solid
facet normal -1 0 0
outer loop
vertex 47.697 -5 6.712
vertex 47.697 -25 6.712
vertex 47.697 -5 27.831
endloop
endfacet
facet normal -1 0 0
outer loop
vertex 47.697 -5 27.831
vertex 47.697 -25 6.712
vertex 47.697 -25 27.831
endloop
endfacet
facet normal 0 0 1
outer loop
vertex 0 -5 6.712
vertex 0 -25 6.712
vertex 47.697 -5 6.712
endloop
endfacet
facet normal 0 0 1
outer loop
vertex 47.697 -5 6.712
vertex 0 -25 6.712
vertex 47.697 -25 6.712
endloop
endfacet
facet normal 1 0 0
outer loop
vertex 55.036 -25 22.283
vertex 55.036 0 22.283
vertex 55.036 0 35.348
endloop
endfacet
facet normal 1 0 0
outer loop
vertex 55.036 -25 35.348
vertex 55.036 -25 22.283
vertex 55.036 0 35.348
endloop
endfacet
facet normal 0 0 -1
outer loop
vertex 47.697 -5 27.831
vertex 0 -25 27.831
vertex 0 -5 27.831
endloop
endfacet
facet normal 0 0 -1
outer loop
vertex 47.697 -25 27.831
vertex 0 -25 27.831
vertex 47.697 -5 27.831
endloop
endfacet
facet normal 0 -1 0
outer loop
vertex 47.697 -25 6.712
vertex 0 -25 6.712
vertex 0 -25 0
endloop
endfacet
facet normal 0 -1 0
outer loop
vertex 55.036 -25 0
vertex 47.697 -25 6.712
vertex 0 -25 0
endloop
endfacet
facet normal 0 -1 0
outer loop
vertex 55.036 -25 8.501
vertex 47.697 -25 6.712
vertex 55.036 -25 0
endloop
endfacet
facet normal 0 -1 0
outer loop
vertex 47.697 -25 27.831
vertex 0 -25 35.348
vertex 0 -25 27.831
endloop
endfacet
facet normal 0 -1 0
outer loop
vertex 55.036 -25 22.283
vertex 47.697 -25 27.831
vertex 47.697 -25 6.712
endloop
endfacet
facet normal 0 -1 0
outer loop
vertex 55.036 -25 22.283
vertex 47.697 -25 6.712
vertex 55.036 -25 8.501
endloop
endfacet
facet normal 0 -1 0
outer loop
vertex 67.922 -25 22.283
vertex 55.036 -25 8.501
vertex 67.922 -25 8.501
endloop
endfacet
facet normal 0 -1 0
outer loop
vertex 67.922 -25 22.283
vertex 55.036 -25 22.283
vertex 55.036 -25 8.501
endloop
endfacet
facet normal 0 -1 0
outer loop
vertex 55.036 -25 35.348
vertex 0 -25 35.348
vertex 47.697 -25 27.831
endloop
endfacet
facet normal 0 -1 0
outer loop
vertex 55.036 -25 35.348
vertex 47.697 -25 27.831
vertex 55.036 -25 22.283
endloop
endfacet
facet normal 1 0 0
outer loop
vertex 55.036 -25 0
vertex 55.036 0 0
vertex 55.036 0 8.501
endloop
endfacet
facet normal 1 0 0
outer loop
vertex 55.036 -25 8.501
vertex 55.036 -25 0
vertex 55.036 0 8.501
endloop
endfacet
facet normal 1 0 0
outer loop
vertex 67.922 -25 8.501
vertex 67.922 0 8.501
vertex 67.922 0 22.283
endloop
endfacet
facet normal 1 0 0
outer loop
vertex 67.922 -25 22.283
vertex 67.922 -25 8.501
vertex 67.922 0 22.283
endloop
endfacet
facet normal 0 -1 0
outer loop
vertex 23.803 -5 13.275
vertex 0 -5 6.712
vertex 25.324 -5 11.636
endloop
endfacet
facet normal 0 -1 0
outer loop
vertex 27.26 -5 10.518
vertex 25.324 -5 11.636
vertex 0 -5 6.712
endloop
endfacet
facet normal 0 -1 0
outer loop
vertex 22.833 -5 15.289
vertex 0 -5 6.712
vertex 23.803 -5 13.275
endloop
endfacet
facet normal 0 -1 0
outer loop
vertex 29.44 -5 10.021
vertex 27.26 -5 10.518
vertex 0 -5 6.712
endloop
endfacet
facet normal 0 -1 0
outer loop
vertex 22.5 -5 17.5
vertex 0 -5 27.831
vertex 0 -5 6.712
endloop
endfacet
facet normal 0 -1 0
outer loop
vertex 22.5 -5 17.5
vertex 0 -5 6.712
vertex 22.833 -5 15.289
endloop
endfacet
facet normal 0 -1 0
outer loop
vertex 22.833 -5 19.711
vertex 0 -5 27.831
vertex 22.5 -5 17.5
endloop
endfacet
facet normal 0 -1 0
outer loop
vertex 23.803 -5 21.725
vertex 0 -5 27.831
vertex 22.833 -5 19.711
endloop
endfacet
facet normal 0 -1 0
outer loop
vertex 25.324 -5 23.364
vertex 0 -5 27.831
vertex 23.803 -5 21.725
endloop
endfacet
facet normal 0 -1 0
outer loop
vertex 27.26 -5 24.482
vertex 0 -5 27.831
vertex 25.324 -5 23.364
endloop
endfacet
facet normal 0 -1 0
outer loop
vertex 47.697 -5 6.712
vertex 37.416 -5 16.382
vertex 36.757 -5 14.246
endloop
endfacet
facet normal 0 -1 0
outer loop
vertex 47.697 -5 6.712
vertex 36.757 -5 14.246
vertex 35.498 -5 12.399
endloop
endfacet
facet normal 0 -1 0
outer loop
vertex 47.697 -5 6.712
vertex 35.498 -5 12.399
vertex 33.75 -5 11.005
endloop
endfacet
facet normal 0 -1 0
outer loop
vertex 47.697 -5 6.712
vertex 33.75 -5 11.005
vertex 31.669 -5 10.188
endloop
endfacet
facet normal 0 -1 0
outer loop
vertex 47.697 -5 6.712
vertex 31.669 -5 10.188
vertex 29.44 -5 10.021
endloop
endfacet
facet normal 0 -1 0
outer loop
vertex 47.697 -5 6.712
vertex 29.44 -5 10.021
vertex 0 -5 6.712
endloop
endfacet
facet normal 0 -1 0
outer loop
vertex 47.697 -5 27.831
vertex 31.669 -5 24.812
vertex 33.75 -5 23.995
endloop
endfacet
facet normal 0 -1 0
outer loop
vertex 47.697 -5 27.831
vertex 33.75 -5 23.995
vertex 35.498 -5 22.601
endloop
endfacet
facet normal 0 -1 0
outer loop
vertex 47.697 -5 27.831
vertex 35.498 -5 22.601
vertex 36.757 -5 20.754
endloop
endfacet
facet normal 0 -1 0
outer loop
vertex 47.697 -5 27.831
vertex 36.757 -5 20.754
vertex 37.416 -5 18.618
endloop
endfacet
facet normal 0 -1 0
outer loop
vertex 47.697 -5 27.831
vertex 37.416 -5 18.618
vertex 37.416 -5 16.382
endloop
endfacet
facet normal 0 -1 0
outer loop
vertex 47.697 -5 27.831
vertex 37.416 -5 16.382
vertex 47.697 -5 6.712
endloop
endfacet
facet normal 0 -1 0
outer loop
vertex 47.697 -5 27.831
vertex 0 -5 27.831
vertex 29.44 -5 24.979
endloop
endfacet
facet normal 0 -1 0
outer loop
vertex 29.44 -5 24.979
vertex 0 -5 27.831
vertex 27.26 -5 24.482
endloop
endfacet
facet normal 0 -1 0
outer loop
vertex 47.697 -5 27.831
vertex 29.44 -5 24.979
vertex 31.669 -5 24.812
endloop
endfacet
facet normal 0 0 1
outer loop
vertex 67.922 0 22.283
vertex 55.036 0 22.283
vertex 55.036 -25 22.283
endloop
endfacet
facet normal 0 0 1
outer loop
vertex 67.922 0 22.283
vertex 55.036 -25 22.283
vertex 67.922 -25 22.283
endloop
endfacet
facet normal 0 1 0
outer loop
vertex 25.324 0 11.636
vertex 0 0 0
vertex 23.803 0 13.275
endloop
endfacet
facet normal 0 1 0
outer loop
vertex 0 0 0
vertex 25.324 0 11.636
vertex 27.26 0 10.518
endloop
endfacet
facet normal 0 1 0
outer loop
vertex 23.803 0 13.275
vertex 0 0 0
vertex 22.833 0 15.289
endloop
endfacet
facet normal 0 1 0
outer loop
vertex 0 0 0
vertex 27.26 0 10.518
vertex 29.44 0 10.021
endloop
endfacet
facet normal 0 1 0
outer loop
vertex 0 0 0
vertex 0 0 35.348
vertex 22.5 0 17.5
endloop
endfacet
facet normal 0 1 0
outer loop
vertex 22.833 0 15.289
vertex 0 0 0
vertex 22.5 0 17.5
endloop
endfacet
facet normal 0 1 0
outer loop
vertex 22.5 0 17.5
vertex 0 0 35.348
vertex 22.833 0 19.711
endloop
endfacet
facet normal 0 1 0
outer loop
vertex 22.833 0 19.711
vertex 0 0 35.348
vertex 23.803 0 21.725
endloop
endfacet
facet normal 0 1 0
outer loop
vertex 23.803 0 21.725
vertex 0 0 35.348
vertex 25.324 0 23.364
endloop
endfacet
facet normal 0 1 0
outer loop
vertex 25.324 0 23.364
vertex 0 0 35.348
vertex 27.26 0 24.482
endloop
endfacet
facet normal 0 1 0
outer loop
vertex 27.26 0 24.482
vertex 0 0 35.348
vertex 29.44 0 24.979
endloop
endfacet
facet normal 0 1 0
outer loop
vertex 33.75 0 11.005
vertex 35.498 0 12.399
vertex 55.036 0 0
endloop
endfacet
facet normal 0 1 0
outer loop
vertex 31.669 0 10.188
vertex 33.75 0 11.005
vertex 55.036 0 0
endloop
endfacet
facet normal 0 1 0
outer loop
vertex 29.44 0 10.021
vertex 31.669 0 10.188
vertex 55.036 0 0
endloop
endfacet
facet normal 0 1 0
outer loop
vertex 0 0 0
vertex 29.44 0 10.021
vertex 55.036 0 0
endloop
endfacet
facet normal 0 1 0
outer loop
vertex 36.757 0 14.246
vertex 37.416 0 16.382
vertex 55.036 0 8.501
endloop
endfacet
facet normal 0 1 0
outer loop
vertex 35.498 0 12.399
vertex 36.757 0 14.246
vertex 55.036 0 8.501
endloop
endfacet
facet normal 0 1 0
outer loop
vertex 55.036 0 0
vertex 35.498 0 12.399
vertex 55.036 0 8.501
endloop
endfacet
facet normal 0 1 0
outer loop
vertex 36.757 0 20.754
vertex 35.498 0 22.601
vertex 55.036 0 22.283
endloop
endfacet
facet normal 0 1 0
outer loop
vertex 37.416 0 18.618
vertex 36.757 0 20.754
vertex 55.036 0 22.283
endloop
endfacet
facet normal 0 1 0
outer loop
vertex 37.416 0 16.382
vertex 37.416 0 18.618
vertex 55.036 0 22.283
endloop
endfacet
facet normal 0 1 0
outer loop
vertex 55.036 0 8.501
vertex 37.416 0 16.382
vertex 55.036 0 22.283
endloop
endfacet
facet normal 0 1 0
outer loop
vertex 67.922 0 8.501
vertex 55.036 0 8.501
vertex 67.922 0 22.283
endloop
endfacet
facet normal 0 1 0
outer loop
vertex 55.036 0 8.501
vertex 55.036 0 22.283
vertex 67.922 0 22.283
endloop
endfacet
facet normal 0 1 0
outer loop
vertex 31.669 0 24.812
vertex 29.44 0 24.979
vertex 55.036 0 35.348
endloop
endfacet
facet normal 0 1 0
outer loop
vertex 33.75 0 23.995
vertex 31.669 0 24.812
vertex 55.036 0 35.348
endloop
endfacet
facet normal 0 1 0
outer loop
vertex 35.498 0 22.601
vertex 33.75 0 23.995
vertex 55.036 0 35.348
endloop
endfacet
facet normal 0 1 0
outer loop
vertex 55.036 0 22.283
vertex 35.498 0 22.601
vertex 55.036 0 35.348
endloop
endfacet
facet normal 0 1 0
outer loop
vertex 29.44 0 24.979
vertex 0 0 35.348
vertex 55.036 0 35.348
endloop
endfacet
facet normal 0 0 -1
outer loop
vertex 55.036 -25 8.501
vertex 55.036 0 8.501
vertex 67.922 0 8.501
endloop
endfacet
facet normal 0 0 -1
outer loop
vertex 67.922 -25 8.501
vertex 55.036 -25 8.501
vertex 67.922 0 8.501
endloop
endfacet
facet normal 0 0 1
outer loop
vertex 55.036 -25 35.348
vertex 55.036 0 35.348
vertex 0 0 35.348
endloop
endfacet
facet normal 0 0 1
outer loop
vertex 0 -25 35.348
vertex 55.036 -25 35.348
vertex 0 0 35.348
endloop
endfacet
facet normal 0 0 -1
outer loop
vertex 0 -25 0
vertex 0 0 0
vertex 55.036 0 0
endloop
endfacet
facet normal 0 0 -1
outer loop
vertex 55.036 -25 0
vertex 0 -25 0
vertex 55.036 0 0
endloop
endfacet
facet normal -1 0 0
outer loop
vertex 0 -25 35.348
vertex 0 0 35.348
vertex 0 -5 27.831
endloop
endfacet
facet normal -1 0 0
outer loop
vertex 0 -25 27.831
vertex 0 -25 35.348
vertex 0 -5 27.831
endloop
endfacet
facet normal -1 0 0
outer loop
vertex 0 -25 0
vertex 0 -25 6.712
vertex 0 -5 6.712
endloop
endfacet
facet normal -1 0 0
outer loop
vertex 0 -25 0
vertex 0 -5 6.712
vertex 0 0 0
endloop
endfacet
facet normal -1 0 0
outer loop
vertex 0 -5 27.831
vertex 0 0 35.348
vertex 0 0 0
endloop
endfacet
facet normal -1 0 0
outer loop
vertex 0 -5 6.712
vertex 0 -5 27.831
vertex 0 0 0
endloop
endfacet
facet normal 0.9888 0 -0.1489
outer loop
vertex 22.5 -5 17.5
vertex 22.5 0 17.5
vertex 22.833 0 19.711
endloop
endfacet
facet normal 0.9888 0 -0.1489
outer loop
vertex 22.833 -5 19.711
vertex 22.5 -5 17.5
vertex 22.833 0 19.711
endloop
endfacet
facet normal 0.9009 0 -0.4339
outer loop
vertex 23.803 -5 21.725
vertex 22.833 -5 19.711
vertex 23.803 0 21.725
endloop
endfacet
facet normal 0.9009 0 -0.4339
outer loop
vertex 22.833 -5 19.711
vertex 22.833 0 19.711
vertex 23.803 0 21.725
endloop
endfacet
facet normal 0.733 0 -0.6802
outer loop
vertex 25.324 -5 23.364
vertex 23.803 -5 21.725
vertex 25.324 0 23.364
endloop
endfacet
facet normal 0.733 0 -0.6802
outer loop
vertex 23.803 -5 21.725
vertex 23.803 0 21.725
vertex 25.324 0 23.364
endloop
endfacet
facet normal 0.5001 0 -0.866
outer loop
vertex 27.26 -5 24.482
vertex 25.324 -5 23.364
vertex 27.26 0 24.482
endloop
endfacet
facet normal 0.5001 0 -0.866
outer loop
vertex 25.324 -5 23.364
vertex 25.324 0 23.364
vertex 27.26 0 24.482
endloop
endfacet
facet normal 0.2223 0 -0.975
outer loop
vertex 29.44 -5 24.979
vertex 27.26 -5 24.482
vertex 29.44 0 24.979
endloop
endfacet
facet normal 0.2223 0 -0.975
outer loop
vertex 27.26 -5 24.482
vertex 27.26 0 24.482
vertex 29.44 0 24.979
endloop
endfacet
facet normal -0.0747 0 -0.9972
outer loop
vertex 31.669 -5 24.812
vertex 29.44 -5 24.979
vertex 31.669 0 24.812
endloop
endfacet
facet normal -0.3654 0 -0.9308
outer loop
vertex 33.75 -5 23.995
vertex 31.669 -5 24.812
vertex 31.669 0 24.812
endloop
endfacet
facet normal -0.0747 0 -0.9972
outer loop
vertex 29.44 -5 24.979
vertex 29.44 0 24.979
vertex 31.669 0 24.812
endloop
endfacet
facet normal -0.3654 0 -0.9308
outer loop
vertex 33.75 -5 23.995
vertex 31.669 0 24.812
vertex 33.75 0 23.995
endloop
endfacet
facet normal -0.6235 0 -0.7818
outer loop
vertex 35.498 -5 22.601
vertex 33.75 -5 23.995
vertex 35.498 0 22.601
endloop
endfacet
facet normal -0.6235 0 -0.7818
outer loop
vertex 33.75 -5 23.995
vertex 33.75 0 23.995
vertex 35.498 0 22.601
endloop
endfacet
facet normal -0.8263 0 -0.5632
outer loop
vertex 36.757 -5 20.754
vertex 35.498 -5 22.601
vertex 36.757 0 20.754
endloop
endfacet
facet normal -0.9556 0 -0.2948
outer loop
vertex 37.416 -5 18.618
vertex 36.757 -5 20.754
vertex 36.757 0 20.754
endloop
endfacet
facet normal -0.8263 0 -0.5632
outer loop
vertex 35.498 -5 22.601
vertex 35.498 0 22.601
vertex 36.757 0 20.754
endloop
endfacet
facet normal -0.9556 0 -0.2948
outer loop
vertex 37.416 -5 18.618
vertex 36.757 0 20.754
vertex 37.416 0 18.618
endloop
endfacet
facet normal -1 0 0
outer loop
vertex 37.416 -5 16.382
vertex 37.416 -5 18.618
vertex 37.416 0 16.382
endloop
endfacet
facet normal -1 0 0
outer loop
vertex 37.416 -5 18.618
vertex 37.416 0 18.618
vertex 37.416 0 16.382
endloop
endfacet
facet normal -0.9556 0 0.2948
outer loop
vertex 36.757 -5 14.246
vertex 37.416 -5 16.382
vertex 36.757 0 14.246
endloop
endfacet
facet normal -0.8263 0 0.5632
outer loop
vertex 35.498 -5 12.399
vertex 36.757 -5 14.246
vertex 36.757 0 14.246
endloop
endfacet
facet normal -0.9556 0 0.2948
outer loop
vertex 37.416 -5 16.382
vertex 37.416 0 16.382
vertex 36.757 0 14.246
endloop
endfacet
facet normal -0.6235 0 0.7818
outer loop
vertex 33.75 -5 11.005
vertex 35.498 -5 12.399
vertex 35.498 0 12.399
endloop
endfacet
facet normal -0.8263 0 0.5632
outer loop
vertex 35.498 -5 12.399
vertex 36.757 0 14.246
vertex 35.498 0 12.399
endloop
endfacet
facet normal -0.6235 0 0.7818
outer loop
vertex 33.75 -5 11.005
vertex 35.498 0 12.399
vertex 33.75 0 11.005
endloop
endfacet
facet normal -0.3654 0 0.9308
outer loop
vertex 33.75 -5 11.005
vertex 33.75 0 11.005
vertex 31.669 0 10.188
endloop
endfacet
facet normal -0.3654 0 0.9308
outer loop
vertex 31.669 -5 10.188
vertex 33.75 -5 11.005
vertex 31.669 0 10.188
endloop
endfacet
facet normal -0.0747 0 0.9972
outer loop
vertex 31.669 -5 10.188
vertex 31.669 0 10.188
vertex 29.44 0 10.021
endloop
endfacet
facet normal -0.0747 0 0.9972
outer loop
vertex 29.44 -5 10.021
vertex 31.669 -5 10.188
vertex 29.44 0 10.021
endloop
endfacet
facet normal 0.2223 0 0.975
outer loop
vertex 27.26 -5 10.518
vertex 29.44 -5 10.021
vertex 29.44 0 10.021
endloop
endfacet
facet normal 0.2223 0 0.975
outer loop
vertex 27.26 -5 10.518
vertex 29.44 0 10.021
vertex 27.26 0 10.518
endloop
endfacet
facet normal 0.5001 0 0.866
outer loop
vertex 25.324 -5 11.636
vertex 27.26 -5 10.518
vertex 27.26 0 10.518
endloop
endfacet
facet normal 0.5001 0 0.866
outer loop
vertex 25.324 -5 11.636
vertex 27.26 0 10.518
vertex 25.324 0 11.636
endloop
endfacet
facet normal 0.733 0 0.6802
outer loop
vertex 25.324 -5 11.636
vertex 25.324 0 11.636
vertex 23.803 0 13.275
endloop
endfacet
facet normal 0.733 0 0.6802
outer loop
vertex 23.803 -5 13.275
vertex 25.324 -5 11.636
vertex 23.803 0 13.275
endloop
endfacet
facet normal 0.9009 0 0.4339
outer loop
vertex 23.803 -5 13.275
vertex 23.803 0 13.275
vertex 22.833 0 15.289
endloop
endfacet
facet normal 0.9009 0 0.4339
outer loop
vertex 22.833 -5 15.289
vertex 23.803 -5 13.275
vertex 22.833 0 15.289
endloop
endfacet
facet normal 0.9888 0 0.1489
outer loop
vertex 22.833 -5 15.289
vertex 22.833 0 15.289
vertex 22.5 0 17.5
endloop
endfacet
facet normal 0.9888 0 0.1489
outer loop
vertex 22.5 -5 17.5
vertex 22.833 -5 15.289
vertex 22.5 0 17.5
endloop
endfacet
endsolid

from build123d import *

# Parameters (mm, degrees)
F0_W     = 12.1704526246
F0_H     = 13.7812504545
F0_W_2   = 12.8863714635
F1_DEPTH = 25
F2_W     = 47.6974435151
F2_H     = 21.1193179712
F3_DEPTH = 20
F4_R     = 7.5
F5_DEPTH = 25


with BuildPart() as f1:
    # F0 (on Front) → F1 (new body)
    with BuildSketch(Plane.XZ):
        Polygon((0, 35.3480130434), (0, 0), (55.0355128944, 0), (55.0355128944, 8.5014207289), (42.8650602698, 8.5014207289), (42.8650602698, 22.2826711833), (55.0355128944, 22.2826711833), (55.0355128944, 35.3480130434), align=None)
        with Locations((48.9502865821, 15.3920459561)):
            Rectangle(F0_W, F0_H)
        with Locations((61.4786986262, 15.3920459561)):
            Rectangle(F0_W_2, F0_H)
    extrude(amount=F1_DEPTH)

    # F2 (on face) → F3 (cut)
    with BuildSketch(Plane.XZ.offset(25)):
        with Locations((23.8487217575, 17.2713068314)):
            Rectangle(F2_W, F2_H)
    extrude(amount=-F3_DEPTH, mode=Mode.SUBTRACT)

    # F4 (on face) → F5 (cut)
    with BuildSketch(Plane(origin=(0, 0, 0), x_dir=(-1, 0, 0), z_dir=(0, 1, 0))):
        with Locations((-30, 17.5)):
            Circle(F4_R)
    extrude(amount=-F5_DEPTH, mode=Mode.SUBTRACT)


solid = f1.part
